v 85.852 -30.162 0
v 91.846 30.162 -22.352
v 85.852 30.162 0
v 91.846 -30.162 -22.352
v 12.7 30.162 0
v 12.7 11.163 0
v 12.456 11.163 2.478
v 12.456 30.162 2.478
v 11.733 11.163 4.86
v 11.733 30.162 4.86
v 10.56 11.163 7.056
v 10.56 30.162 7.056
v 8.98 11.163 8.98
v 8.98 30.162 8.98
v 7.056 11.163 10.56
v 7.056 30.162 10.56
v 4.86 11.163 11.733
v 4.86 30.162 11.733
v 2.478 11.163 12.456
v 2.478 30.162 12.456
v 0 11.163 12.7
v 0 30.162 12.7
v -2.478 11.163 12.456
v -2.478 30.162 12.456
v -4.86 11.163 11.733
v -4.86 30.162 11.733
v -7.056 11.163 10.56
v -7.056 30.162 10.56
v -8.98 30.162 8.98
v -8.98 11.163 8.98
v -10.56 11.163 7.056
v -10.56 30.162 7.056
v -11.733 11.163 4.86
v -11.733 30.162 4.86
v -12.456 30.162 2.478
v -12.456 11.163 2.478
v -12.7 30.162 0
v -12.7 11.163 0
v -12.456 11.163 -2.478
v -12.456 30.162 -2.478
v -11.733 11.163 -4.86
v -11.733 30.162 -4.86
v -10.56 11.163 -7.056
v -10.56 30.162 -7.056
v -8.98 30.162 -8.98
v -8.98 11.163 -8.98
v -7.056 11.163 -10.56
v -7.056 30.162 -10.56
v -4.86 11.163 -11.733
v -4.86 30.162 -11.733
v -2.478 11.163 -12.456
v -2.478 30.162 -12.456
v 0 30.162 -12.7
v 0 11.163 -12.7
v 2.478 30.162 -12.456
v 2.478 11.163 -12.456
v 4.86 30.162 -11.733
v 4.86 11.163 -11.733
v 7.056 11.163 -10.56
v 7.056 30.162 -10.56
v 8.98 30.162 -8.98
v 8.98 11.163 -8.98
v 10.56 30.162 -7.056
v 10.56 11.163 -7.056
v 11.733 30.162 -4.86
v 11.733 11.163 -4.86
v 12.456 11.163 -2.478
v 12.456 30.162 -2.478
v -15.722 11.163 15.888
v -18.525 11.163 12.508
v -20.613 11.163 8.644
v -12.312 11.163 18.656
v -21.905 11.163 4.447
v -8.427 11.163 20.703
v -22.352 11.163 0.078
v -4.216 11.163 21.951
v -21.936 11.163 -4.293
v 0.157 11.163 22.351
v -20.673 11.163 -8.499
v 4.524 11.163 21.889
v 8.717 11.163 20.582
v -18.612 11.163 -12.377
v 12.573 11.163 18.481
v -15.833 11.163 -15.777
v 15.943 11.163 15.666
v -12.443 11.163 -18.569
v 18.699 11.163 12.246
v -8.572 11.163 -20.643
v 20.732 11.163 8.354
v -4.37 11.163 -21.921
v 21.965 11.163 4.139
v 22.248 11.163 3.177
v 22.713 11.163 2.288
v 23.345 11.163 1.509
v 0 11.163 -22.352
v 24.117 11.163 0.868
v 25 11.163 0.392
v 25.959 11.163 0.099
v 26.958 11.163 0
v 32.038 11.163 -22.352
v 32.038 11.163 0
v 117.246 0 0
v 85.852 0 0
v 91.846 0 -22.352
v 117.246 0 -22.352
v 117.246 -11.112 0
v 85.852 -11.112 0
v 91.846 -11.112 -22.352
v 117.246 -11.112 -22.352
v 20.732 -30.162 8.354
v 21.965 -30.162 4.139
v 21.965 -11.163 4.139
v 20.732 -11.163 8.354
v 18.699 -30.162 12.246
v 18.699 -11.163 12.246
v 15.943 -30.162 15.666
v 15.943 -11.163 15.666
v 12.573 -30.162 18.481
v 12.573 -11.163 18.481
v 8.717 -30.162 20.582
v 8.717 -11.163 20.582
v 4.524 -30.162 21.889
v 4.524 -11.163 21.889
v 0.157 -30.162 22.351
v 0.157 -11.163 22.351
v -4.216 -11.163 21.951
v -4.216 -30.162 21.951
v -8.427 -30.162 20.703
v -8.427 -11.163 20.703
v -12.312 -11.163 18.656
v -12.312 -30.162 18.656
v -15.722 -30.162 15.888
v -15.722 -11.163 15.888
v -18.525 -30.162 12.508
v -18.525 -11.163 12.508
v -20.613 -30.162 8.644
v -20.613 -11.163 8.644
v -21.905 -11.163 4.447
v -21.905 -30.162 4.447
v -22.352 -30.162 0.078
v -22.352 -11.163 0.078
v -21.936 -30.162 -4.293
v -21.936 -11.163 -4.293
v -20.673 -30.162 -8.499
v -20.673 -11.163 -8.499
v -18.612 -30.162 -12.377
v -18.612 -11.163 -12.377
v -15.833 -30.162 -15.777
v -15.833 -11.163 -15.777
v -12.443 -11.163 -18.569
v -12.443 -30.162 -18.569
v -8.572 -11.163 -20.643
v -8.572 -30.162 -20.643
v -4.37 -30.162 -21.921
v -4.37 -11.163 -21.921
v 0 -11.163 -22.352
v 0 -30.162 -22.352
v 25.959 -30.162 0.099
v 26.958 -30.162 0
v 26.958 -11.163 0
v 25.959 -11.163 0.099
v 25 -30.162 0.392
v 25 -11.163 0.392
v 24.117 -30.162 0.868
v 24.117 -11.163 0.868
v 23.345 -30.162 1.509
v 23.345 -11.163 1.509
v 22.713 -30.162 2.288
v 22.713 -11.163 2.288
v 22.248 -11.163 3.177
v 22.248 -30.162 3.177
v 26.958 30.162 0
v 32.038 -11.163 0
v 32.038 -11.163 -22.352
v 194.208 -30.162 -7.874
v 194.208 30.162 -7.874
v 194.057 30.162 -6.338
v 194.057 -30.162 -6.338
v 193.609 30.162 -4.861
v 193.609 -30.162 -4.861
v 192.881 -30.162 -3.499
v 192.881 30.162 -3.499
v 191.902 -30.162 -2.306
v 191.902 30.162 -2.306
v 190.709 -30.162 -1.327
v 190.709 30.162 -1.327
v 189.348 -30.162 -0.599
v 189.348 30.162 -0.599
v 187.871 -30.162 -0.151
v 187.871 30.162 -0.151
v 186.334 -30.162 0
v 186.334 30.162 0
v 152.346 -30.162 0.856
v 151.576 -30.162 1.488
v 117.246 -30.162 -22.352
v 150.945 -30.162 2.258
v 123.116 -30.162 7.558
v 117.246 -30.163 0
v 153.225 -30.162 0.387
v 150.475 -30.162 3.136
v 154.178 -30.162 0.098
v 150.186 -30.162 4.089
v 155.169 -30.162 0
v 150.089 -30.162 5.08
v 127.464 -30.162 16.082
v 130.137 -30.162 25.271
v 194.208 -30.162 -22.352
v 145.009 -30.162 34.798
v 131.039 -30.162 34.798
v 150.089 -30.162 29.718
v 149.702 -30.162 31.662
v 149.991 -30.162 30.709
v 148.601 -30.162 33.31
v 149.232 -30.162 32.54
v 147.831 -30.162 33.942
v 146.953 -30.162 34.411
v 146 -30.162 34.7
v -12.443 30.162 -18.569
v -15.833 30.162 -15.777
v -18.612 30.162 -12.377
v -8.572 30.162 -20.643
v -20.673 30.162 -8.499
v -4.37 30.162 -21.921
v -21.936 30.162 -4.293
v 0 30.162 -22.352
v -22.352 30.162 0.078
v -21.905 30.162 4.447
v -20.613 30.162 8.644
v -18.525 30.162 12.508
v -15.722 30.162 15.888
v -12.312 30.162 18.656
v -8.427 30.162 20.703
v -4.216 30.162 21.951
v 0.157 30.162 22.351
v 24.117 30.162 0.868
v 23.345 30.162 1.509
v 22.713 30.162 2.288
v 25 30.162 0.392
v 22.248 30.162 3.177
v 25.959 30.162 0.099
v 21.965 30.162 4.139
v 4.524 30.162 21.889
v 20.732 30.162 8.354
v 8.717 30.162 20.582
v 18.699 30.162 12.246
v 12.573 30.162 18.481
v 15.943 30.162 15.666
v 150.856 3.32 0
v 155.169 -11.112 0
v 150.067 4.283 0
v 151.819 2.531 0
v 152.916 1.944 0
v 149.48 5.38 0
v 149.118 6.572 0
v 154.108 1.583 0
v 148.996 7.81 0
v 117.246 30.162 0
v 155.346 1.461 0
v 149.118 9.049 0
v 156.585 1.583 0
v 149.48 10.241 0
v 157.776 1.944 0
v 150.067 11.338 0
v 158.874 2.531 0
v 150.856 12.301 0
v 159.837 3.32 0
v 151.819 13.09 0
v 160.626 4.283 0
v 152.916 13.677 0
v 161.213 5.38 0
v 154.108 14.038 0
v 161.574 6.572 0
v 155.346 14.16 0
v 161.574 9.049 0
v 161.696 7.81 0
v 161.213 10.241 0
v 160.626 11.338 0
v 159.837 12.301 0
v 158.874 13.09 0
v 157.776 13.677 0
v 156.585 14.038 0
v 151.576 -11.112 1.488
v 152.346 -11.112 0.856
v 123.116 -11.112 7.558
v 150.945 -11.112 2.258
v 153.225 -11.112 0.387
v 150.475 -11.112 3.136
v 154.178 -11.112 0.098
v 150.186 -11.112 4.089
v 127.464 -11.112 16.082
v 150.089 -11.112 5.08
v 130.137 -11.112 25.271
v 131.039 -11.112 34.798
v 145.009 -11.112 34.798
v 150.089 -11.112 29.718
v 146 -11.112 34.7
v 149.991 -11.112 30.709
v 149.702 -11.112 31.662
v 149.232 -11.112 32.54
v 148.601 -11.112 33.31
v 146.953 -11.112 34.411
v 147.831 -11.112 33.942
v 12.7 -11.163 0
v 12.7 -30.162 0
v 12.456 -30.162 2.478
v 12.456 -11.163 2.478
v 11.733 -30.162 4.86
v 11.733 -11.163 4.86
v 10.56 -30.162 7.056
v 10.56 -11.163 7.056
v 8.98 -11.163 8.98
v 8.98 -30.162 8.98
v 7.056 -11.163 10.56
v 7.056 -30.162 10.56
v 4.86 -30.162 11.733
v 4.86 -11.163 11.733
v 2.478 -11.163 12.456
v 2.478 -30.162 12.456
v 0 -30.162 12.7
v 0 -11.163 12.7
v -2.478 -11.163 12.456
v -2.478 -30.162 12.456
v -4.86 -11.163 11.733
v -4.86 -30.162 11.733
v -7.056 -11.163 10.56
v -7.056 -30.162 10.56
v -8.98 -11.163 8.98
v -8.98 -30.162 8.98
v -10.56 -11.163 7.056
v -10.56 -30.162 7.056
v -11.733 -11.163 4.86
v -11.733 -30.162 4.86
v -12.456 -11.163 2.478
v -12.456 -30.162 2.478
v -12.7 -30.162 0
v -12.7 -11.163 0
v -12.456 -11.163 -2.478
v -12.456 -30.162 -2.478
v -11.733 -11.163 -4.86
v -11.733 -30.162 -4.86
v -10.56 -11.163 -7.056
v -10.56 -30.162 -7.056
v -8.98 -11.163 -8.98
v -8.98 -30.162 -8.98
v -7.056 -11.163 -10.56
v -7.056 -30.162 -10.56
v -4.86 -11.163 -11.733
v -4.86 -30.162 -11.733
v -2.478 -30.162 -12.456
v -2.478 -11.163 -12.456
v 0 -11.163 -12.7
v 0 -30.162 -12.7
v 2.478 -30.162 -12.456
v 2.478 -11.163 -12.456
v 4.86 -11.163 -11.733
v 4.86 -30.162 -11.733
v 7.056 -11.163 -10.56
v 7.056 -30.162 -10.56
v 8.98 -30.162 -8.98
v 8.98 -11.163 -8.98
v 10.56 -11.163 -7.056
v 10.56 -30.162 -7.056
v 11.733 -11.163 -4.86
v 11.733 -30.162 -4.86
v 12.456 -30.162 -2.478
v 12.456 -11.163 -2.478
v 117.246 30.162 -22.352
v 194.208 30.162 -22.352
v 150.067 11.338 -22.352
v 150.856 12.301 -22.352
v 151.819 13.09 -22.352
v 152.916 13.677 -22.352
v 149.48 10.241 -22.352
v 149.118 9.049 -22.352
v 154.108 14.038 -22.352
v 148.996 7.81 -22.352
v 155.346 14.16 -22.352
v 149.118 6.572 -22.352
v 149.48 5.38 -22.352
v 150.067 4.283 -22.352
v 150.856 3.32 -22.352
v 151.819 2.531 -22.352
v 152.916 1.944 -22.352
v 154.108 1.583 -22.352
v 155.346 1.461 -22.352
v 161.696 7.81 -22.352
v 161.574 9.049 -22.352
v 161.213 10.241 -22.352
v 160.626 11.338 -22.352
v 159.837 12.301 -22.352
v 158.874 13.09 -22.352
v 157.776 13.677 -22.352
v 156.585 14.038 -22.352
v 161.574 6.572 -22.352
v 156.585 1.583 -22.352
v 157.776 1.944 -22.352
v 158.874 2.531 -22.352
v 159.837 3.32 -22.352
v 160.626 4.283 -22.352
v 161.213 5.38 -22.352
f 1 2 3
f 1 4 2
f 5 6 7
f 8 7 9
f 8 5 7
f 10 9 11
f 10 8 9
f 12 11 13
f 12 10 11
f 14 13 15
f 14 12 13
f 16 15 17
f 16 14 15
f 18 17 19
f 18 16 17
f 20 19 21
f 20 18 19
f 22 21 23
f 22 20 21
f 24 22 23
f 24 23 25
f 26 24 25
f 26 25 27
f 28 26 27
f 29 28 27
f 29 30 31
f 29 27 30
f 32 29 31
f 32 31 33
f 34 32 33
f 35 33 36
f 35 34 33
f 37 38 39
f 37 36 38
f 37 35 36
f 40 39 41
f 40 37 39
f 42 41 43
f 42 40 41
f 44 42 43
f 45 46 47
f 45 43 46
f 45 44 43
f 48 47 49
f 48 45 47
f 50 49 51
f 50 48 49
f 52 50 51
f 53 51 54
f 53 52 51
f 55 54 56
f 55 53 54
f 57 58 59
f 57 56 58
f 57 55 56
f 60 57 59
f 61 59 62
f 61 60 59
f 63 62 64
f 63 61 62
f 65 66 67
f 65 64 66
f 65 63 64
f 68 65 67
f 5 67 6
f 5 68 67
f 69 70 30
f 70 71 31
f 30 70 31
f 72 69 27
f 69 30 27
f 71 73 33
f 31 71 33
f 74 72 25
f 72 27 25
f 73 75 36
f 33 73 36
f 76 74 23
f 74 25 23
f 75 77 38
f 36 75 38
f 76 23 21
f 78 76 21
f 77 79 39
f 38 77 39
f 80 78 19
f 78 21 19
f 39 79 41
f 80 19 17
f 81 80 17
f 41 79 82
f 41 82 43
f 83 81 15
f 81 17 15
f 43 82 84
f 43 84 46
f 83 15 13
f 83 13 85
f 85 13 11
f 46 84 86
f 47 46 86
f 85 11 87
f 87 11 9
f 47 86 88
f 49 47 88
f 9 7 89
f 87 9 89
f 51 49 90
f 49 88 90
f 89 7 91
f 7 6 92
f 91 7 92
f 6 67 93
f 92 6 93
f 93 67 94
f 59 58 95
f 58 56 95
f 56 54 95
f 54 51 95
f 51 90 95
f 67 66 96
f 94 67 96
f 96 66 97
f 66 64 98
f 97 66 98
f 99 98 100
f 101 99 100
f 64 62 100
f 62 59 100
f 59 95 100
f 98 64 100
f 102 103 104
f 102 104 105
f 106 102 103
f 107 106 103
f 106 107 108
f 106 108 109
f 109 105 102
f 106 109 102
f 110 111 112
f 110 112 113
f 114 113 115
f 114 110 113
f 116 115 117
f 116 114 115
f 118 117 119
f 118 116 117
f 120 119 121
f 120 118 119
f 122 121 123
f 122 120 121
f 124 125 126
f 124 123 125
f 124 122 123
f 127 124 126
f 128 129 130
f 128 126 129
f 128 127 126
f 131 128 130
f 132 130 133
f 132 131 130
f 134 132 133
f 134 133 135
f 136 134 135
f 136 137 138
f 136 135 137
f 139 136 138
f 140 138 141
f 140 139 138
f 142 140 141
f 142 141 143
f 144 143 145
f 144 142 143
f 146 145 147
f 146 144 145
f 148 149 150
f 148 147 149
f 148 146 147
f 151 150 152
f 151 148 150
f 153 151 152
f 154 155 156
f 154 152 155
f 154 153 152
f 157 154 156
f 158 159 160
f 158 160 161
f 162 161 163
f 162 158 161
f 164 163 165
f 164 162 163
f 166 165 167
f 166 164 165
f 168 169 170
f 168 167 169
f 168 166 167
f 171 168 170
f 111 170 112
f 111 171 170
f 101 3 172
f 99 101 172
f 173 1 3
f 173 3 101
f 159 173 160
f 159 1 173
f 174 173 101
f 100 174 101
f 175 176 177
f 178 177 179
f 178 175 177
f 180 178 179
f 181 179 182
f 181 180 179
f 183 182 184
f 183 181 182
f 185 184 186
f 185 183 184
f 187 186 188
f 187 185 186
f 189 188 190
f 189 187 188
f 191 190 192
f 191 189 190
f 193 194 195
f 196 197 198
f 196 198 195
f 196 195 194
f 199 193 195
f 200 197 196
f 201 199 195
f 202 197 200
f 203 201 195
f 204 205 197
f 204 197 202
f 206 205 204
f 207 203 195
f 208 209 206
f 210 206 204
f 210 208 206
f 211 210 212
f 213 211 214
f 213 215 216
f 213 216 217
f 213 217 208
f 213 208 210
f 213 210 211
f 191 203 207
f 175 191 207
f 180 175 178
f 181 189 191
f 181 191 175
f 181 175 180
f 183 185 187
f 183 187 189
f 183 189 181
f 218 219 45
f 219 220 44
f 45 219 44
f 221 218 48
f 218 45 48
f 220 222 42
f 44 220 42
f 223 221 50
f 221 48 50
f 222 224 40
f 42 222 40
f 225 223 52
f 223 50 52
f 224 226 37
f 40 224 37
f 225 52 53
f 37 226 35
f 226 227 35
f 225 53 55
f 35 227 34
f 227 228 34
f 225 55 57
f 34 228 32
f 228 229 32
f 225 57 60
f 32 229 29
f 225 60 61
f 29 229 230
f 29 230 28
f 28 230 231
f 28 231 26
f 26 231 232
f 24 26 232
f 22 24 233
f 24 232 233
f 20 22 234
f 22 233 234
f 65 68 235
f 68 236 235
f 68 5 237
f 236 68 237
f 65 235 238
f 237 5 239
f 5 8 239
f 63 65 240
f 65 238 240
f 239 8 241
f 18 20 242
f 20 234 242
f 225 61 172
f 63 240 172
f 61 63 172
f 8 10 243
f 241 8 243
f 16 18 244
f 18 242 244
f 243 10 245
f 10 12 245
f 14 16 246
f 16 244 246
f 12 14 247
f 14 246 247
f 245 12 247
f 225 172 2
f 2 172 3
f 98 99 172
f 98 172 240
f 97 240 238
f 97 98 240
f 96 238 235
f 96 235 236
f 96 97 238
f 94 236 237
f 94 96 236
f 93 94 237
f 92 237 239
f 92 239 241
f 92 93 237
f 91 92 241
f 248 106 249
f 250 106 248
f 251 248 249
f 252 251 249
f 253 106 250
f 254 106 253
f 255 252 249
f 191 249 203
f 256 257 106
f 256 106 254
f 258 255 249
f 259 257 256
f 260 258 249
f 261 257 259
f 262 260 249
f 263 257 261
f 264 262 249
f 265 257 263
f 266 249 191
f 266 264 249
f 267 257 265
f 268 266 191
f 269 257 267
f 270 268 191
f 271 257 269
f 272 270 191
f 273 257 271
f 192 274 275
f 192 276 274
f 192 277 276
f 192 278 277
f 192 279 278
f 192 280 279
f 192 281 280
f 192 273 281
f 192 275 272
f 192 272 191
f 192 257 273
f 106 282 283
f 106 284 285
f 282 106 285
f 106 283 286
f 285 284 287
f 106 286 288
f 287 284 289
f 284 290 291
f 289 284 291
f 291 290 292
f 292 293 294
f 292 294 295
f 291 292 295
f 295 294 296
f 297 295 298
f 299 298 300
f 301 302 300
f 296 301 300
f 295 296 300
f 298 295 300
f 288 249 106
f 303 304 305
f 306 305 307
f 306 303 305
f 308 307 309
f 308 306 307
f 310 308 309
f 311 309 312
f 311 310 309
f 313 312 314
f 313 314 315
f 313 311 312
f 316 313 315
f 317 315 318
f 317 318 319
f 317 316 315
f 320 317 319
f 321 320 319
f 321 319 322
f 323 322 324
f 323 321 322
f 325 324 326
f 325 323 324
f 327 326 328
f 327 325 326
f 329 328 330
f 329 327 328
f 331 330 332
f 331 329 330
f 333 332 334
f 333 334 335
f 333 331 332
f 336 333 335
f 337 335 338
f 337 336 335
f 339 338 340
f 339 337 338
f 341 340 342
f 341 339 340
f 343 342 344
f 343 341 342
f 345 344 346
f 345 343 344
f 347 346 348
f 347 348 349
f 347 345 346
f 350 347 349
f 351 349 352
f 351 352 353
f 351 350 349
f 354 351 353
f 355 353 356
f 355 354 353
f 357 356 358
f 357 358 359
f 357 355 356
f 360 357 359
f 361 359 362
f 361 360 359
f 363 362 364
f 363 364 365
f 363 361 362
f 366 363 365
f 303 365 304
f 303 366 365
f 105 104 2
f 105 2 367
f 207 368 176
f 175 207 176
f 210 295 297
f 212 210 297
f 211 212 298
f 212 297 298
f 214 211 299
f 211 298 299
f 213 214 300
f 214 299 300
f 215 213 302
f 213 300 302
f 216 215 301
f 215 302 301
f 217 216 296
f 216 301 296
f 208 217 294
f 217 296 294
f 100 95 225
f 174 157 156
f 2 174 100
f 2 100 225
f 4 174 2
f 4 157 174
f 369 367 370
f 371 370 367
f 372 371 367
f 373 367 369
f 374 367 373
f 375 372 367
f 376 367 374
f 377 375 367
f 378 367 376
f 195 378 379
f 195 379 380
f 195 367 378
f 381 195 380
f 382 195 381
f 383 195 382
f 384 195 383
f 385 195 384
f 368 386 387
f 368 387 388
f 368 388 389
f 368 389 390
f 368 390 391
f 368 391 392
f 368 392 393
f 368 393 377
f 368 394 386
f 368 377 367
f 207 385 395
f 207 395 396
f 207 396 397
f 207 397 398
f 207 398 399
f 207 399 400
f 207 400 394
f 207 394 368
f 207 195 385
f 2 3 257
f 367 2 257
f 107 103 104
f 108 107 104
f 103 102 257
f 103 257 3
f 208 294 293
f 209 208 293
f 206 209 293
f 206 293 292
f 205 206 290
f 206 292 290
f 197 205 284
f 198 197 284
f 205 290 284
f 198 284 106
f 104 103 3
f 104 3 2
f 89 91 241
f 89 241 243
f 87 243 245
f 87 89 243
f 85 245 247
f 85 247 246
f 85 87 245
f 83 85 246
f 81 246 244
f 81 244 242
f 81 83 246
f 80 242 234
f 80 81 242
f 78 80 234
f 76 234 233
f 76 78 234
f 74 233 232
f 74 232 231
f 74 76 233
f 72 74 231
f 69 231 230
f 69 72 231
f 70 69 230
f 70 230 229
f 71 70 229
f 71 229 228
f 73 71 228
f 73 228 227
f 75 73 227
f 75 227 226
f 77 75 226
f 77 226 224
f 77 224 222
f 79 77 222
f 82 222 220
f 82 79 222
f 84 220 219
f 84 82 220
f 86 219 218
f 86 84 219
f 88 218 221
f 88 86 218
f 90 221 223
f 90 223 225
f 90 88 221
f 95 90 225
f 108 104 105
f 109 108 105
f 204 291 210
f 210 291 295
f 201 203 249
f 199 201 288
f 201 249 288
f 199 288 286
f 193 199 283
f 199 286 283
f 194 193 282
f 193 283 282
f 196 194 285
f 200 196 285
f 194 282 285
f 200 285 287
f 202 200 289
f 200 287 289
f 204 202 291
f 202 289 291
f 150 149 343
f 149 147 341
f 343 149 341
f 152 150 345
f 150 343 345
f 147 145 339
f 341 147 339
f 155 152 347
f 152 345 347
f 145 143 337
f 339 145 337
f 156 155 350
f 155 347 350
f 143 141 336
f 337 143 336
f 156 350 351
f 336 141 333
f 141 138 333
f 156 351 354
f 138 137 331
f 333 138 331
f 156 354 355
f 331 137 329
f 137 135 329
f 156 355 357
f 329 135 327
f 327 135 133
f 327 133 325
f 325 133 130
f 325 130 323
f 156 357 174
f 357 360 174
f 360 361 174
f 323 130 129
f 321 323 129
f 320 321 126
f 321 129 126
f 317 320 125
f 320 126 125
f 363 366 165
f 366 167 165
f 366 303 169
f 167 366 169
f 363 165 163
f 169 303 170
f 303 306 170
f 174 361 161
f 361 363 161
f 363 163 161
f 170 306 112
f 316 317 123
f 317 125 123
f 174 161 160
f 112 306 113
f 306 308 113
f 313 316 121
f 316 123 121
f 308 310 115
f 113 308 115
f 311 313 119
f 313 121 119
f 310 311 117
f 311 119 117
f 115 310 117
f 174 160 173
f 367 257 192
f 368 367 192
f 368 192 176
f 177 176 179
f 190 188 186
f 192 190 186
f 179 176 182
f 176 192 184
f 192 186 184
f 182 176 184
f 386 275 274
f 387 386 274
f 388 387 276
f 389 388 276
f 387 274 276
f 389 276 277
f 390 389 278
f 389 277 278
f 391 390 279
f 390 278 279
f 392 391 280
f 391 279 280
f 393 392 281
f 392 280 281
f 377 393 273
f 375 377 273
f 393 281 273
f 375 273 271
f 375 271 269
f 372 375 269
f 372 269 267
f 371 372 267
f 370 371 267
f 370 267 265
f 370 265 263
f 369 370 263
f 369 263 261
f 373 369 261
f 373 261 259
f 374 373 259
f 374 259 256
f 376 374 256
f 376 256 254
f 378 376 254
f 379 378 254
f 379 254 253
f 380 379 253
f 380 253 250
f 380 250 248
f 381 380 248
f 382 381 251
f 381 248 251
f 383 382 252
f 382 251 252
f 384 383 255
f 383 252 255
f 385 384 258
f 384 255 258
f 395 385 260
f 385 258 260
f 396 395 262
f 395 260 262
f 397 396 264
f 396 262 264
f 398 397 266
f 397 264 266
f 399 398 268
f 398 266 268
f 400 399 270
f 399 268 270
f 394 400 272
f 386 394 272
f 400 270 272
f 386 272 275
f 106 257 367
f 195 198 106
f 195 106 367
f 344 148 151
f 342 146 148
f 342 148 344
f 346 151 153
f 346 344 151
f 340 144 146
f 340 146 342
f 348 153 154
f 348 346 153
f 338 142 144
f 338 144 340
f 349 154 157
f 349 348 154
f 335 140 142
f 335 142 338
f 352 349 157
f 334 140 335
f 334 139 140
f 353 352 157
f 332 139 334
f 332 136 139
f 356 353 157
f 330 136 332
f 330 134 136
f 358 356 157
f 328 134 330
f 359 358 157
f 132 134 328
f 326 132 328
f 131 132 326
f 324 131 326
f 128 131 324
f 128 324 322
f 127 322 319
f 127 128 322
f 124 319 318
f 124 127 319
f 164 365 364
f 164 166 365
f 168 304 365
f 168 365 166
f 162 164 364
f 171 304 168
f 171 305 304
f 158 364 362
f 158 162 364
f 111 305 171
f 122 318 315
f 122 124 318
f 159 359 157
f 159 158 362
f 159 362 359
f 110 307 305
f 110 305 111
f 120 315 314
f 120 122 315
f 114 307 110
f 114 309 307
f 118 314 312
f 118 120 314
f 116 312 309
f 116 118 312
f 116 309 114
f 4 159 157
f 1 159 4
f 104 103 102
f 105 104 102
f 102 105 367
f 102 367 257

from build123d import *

# Parameters (mm, degrees)
F0_R          = 12.7
F1_DEPTH      = 30.1625
F2_DEPTH      = 30.1625
F3_DEPTH      = 11.1125
F4_DEPTH      = 30.1625
F5_DEPTH      = 11.1125
F6_W          = 54.389526296
F6_H          = 22.3266
F7_DEPTH      = 22.353
F7_DEPTH_BACK = 34.799
F6_R          = 6.35
F8_DEPTH      = 22.353


with BuildPart() as f1:
    # F0 (on Front) → F1 (new body, symmetric)
    with BuildSketch(Plane.XZ):
        with BuildLine():
            ThreePointArc((26.957526296, 0), (23.7150398244, 1.1694141767), (21.9653917967, 4.1392592593))
            ThreePointArc((21.9653917967, 4.1392592593), (-17.2065776226, 14.266940475), (0, -22.352))
            Line((0, -22.352), (91.8464, -22.352))
            Line((91.8464, -22.352), (85.852, 0))
            Line((85.852, 0), (26.957526296, 0))
        make_face()
        Circle(F0_R, mode=Mode.SUBTRACT)
    extrude(amount=F1_DEPTH, both=True)

    # F6 (on Top) → F7 (cut, two sides)
    with BuildSketch(Plane.XY) as f7_sk:
        with Locations((4.842763148, 0)):
            Rectangle(F6_W, F6_H)
    extrude(amount=-F7_DEPTH, mode=Mode.SUBTRACT)
    extrude(f7_sk.sketch, amount=F7_DEPTH_BACK, mode=Mode.SUBTRACT)


with BuildPart() as f1b:
    # F0 (on Front) → F1, piece 2 (new body, symmetric)
    with BuildSketch(Plane.XZ):
        with BuildLine():
            Line((117.2464, 0), (117.2464, -22.352))
            Line((117.2464, -22.352), (194.2084, -22.352))
            Line((194.2084, -22.352), (194.2084, -7.874))
            ThreePointArc((194.2084, -7.874), (191.9021587951, -2.3062412049), (186.3344, 0))
            Line((186.3344, 0), (155.1686, 0))
            Line((155.1686, 0), (117.2464, 0))
        make_face()
    extrude(amount=F1_DEPTH, both=True)

    # F0 (on Front) → F4 (join, through all)
    with BuildSketch(Plane.XZ):
        with BuildLine():
            ThreePointArc((131.0386, 34.798), (127.4644153616, 16.0823576341), (117.2464, 0))
            Line((117.2464, 0), (155.1686, 0))
            ThreePointArc((155.1686, 0), (151.5764975516, 1.4878975516), (150.0886, 5.08))
            Line((150.0886, 5.08), (150.0886, 29.718))
            ThreePointArc((150.0886, 29.718), (148.6007024484, 33.3101024484), (145.0086, 34.798))
            Line((145.0086, 34.798), (131.0386, 34.798))
        make_face()
    extrude(amount=F4_DEPTH)

    # F0 (on Front) → F5 (cut, through all)
    with BuildSketch(Plane.XZ):
        with BuildLine():
            ThreePointArc((131.0386, 34.798), (127.4644153616, 16.0823576341), (117.2464, 0))
            Line((117.2464, 0), (155.1686, 0))
            ThreePointArc((155.1686, 0), (151.5764975516, 1.4878975516), (150.0886, 5.08))
            Line((150.0886, 5.08), (150.0886, 29.718))
            ThreePointArc((150.0886, 29.718), (148.6007024484, 33.3101024484), (145.0086, 34.798))
            Line((145.0086, 34.798), (131.0386, 34.798))
        make_face()
    extrude(amount=F5_DEPTH, mode=Mode.SUBTRACT)

    # F6 (on Top) → F8 (cut, through all)
    with BuildSketch(Plane.XY):
        with Locations((155.3464, 7.8105)):
            Circle(F6_R)
    extrude(amount=-F8_DEPTH, mode=Mode.SUBTRACT)


with BuildPart() as f2:
    # F0 (on Front) → F2 (new body)
    with BuildSketch(Plane.XZ):
        Polygon((85.852, 0), (91.8464, -22.352), (117.2464, -22.352), (117.2464, 0), align=None)
    extrude(amount=-F2_DEPTH)


with BuildPart() as f3:
    # F0 (on Front) → F3 (new body)
    with BuildSketch(Plane.XZ):
        Polygon((85.852, 0), (91.8464, -22.352), (117.2464, -22.352), (117.2464, 0), align=None)
    extrude(amount=F3_DEPTH)


solid = Compound([f1.part, f1b.part, f2.part, f3.part])
